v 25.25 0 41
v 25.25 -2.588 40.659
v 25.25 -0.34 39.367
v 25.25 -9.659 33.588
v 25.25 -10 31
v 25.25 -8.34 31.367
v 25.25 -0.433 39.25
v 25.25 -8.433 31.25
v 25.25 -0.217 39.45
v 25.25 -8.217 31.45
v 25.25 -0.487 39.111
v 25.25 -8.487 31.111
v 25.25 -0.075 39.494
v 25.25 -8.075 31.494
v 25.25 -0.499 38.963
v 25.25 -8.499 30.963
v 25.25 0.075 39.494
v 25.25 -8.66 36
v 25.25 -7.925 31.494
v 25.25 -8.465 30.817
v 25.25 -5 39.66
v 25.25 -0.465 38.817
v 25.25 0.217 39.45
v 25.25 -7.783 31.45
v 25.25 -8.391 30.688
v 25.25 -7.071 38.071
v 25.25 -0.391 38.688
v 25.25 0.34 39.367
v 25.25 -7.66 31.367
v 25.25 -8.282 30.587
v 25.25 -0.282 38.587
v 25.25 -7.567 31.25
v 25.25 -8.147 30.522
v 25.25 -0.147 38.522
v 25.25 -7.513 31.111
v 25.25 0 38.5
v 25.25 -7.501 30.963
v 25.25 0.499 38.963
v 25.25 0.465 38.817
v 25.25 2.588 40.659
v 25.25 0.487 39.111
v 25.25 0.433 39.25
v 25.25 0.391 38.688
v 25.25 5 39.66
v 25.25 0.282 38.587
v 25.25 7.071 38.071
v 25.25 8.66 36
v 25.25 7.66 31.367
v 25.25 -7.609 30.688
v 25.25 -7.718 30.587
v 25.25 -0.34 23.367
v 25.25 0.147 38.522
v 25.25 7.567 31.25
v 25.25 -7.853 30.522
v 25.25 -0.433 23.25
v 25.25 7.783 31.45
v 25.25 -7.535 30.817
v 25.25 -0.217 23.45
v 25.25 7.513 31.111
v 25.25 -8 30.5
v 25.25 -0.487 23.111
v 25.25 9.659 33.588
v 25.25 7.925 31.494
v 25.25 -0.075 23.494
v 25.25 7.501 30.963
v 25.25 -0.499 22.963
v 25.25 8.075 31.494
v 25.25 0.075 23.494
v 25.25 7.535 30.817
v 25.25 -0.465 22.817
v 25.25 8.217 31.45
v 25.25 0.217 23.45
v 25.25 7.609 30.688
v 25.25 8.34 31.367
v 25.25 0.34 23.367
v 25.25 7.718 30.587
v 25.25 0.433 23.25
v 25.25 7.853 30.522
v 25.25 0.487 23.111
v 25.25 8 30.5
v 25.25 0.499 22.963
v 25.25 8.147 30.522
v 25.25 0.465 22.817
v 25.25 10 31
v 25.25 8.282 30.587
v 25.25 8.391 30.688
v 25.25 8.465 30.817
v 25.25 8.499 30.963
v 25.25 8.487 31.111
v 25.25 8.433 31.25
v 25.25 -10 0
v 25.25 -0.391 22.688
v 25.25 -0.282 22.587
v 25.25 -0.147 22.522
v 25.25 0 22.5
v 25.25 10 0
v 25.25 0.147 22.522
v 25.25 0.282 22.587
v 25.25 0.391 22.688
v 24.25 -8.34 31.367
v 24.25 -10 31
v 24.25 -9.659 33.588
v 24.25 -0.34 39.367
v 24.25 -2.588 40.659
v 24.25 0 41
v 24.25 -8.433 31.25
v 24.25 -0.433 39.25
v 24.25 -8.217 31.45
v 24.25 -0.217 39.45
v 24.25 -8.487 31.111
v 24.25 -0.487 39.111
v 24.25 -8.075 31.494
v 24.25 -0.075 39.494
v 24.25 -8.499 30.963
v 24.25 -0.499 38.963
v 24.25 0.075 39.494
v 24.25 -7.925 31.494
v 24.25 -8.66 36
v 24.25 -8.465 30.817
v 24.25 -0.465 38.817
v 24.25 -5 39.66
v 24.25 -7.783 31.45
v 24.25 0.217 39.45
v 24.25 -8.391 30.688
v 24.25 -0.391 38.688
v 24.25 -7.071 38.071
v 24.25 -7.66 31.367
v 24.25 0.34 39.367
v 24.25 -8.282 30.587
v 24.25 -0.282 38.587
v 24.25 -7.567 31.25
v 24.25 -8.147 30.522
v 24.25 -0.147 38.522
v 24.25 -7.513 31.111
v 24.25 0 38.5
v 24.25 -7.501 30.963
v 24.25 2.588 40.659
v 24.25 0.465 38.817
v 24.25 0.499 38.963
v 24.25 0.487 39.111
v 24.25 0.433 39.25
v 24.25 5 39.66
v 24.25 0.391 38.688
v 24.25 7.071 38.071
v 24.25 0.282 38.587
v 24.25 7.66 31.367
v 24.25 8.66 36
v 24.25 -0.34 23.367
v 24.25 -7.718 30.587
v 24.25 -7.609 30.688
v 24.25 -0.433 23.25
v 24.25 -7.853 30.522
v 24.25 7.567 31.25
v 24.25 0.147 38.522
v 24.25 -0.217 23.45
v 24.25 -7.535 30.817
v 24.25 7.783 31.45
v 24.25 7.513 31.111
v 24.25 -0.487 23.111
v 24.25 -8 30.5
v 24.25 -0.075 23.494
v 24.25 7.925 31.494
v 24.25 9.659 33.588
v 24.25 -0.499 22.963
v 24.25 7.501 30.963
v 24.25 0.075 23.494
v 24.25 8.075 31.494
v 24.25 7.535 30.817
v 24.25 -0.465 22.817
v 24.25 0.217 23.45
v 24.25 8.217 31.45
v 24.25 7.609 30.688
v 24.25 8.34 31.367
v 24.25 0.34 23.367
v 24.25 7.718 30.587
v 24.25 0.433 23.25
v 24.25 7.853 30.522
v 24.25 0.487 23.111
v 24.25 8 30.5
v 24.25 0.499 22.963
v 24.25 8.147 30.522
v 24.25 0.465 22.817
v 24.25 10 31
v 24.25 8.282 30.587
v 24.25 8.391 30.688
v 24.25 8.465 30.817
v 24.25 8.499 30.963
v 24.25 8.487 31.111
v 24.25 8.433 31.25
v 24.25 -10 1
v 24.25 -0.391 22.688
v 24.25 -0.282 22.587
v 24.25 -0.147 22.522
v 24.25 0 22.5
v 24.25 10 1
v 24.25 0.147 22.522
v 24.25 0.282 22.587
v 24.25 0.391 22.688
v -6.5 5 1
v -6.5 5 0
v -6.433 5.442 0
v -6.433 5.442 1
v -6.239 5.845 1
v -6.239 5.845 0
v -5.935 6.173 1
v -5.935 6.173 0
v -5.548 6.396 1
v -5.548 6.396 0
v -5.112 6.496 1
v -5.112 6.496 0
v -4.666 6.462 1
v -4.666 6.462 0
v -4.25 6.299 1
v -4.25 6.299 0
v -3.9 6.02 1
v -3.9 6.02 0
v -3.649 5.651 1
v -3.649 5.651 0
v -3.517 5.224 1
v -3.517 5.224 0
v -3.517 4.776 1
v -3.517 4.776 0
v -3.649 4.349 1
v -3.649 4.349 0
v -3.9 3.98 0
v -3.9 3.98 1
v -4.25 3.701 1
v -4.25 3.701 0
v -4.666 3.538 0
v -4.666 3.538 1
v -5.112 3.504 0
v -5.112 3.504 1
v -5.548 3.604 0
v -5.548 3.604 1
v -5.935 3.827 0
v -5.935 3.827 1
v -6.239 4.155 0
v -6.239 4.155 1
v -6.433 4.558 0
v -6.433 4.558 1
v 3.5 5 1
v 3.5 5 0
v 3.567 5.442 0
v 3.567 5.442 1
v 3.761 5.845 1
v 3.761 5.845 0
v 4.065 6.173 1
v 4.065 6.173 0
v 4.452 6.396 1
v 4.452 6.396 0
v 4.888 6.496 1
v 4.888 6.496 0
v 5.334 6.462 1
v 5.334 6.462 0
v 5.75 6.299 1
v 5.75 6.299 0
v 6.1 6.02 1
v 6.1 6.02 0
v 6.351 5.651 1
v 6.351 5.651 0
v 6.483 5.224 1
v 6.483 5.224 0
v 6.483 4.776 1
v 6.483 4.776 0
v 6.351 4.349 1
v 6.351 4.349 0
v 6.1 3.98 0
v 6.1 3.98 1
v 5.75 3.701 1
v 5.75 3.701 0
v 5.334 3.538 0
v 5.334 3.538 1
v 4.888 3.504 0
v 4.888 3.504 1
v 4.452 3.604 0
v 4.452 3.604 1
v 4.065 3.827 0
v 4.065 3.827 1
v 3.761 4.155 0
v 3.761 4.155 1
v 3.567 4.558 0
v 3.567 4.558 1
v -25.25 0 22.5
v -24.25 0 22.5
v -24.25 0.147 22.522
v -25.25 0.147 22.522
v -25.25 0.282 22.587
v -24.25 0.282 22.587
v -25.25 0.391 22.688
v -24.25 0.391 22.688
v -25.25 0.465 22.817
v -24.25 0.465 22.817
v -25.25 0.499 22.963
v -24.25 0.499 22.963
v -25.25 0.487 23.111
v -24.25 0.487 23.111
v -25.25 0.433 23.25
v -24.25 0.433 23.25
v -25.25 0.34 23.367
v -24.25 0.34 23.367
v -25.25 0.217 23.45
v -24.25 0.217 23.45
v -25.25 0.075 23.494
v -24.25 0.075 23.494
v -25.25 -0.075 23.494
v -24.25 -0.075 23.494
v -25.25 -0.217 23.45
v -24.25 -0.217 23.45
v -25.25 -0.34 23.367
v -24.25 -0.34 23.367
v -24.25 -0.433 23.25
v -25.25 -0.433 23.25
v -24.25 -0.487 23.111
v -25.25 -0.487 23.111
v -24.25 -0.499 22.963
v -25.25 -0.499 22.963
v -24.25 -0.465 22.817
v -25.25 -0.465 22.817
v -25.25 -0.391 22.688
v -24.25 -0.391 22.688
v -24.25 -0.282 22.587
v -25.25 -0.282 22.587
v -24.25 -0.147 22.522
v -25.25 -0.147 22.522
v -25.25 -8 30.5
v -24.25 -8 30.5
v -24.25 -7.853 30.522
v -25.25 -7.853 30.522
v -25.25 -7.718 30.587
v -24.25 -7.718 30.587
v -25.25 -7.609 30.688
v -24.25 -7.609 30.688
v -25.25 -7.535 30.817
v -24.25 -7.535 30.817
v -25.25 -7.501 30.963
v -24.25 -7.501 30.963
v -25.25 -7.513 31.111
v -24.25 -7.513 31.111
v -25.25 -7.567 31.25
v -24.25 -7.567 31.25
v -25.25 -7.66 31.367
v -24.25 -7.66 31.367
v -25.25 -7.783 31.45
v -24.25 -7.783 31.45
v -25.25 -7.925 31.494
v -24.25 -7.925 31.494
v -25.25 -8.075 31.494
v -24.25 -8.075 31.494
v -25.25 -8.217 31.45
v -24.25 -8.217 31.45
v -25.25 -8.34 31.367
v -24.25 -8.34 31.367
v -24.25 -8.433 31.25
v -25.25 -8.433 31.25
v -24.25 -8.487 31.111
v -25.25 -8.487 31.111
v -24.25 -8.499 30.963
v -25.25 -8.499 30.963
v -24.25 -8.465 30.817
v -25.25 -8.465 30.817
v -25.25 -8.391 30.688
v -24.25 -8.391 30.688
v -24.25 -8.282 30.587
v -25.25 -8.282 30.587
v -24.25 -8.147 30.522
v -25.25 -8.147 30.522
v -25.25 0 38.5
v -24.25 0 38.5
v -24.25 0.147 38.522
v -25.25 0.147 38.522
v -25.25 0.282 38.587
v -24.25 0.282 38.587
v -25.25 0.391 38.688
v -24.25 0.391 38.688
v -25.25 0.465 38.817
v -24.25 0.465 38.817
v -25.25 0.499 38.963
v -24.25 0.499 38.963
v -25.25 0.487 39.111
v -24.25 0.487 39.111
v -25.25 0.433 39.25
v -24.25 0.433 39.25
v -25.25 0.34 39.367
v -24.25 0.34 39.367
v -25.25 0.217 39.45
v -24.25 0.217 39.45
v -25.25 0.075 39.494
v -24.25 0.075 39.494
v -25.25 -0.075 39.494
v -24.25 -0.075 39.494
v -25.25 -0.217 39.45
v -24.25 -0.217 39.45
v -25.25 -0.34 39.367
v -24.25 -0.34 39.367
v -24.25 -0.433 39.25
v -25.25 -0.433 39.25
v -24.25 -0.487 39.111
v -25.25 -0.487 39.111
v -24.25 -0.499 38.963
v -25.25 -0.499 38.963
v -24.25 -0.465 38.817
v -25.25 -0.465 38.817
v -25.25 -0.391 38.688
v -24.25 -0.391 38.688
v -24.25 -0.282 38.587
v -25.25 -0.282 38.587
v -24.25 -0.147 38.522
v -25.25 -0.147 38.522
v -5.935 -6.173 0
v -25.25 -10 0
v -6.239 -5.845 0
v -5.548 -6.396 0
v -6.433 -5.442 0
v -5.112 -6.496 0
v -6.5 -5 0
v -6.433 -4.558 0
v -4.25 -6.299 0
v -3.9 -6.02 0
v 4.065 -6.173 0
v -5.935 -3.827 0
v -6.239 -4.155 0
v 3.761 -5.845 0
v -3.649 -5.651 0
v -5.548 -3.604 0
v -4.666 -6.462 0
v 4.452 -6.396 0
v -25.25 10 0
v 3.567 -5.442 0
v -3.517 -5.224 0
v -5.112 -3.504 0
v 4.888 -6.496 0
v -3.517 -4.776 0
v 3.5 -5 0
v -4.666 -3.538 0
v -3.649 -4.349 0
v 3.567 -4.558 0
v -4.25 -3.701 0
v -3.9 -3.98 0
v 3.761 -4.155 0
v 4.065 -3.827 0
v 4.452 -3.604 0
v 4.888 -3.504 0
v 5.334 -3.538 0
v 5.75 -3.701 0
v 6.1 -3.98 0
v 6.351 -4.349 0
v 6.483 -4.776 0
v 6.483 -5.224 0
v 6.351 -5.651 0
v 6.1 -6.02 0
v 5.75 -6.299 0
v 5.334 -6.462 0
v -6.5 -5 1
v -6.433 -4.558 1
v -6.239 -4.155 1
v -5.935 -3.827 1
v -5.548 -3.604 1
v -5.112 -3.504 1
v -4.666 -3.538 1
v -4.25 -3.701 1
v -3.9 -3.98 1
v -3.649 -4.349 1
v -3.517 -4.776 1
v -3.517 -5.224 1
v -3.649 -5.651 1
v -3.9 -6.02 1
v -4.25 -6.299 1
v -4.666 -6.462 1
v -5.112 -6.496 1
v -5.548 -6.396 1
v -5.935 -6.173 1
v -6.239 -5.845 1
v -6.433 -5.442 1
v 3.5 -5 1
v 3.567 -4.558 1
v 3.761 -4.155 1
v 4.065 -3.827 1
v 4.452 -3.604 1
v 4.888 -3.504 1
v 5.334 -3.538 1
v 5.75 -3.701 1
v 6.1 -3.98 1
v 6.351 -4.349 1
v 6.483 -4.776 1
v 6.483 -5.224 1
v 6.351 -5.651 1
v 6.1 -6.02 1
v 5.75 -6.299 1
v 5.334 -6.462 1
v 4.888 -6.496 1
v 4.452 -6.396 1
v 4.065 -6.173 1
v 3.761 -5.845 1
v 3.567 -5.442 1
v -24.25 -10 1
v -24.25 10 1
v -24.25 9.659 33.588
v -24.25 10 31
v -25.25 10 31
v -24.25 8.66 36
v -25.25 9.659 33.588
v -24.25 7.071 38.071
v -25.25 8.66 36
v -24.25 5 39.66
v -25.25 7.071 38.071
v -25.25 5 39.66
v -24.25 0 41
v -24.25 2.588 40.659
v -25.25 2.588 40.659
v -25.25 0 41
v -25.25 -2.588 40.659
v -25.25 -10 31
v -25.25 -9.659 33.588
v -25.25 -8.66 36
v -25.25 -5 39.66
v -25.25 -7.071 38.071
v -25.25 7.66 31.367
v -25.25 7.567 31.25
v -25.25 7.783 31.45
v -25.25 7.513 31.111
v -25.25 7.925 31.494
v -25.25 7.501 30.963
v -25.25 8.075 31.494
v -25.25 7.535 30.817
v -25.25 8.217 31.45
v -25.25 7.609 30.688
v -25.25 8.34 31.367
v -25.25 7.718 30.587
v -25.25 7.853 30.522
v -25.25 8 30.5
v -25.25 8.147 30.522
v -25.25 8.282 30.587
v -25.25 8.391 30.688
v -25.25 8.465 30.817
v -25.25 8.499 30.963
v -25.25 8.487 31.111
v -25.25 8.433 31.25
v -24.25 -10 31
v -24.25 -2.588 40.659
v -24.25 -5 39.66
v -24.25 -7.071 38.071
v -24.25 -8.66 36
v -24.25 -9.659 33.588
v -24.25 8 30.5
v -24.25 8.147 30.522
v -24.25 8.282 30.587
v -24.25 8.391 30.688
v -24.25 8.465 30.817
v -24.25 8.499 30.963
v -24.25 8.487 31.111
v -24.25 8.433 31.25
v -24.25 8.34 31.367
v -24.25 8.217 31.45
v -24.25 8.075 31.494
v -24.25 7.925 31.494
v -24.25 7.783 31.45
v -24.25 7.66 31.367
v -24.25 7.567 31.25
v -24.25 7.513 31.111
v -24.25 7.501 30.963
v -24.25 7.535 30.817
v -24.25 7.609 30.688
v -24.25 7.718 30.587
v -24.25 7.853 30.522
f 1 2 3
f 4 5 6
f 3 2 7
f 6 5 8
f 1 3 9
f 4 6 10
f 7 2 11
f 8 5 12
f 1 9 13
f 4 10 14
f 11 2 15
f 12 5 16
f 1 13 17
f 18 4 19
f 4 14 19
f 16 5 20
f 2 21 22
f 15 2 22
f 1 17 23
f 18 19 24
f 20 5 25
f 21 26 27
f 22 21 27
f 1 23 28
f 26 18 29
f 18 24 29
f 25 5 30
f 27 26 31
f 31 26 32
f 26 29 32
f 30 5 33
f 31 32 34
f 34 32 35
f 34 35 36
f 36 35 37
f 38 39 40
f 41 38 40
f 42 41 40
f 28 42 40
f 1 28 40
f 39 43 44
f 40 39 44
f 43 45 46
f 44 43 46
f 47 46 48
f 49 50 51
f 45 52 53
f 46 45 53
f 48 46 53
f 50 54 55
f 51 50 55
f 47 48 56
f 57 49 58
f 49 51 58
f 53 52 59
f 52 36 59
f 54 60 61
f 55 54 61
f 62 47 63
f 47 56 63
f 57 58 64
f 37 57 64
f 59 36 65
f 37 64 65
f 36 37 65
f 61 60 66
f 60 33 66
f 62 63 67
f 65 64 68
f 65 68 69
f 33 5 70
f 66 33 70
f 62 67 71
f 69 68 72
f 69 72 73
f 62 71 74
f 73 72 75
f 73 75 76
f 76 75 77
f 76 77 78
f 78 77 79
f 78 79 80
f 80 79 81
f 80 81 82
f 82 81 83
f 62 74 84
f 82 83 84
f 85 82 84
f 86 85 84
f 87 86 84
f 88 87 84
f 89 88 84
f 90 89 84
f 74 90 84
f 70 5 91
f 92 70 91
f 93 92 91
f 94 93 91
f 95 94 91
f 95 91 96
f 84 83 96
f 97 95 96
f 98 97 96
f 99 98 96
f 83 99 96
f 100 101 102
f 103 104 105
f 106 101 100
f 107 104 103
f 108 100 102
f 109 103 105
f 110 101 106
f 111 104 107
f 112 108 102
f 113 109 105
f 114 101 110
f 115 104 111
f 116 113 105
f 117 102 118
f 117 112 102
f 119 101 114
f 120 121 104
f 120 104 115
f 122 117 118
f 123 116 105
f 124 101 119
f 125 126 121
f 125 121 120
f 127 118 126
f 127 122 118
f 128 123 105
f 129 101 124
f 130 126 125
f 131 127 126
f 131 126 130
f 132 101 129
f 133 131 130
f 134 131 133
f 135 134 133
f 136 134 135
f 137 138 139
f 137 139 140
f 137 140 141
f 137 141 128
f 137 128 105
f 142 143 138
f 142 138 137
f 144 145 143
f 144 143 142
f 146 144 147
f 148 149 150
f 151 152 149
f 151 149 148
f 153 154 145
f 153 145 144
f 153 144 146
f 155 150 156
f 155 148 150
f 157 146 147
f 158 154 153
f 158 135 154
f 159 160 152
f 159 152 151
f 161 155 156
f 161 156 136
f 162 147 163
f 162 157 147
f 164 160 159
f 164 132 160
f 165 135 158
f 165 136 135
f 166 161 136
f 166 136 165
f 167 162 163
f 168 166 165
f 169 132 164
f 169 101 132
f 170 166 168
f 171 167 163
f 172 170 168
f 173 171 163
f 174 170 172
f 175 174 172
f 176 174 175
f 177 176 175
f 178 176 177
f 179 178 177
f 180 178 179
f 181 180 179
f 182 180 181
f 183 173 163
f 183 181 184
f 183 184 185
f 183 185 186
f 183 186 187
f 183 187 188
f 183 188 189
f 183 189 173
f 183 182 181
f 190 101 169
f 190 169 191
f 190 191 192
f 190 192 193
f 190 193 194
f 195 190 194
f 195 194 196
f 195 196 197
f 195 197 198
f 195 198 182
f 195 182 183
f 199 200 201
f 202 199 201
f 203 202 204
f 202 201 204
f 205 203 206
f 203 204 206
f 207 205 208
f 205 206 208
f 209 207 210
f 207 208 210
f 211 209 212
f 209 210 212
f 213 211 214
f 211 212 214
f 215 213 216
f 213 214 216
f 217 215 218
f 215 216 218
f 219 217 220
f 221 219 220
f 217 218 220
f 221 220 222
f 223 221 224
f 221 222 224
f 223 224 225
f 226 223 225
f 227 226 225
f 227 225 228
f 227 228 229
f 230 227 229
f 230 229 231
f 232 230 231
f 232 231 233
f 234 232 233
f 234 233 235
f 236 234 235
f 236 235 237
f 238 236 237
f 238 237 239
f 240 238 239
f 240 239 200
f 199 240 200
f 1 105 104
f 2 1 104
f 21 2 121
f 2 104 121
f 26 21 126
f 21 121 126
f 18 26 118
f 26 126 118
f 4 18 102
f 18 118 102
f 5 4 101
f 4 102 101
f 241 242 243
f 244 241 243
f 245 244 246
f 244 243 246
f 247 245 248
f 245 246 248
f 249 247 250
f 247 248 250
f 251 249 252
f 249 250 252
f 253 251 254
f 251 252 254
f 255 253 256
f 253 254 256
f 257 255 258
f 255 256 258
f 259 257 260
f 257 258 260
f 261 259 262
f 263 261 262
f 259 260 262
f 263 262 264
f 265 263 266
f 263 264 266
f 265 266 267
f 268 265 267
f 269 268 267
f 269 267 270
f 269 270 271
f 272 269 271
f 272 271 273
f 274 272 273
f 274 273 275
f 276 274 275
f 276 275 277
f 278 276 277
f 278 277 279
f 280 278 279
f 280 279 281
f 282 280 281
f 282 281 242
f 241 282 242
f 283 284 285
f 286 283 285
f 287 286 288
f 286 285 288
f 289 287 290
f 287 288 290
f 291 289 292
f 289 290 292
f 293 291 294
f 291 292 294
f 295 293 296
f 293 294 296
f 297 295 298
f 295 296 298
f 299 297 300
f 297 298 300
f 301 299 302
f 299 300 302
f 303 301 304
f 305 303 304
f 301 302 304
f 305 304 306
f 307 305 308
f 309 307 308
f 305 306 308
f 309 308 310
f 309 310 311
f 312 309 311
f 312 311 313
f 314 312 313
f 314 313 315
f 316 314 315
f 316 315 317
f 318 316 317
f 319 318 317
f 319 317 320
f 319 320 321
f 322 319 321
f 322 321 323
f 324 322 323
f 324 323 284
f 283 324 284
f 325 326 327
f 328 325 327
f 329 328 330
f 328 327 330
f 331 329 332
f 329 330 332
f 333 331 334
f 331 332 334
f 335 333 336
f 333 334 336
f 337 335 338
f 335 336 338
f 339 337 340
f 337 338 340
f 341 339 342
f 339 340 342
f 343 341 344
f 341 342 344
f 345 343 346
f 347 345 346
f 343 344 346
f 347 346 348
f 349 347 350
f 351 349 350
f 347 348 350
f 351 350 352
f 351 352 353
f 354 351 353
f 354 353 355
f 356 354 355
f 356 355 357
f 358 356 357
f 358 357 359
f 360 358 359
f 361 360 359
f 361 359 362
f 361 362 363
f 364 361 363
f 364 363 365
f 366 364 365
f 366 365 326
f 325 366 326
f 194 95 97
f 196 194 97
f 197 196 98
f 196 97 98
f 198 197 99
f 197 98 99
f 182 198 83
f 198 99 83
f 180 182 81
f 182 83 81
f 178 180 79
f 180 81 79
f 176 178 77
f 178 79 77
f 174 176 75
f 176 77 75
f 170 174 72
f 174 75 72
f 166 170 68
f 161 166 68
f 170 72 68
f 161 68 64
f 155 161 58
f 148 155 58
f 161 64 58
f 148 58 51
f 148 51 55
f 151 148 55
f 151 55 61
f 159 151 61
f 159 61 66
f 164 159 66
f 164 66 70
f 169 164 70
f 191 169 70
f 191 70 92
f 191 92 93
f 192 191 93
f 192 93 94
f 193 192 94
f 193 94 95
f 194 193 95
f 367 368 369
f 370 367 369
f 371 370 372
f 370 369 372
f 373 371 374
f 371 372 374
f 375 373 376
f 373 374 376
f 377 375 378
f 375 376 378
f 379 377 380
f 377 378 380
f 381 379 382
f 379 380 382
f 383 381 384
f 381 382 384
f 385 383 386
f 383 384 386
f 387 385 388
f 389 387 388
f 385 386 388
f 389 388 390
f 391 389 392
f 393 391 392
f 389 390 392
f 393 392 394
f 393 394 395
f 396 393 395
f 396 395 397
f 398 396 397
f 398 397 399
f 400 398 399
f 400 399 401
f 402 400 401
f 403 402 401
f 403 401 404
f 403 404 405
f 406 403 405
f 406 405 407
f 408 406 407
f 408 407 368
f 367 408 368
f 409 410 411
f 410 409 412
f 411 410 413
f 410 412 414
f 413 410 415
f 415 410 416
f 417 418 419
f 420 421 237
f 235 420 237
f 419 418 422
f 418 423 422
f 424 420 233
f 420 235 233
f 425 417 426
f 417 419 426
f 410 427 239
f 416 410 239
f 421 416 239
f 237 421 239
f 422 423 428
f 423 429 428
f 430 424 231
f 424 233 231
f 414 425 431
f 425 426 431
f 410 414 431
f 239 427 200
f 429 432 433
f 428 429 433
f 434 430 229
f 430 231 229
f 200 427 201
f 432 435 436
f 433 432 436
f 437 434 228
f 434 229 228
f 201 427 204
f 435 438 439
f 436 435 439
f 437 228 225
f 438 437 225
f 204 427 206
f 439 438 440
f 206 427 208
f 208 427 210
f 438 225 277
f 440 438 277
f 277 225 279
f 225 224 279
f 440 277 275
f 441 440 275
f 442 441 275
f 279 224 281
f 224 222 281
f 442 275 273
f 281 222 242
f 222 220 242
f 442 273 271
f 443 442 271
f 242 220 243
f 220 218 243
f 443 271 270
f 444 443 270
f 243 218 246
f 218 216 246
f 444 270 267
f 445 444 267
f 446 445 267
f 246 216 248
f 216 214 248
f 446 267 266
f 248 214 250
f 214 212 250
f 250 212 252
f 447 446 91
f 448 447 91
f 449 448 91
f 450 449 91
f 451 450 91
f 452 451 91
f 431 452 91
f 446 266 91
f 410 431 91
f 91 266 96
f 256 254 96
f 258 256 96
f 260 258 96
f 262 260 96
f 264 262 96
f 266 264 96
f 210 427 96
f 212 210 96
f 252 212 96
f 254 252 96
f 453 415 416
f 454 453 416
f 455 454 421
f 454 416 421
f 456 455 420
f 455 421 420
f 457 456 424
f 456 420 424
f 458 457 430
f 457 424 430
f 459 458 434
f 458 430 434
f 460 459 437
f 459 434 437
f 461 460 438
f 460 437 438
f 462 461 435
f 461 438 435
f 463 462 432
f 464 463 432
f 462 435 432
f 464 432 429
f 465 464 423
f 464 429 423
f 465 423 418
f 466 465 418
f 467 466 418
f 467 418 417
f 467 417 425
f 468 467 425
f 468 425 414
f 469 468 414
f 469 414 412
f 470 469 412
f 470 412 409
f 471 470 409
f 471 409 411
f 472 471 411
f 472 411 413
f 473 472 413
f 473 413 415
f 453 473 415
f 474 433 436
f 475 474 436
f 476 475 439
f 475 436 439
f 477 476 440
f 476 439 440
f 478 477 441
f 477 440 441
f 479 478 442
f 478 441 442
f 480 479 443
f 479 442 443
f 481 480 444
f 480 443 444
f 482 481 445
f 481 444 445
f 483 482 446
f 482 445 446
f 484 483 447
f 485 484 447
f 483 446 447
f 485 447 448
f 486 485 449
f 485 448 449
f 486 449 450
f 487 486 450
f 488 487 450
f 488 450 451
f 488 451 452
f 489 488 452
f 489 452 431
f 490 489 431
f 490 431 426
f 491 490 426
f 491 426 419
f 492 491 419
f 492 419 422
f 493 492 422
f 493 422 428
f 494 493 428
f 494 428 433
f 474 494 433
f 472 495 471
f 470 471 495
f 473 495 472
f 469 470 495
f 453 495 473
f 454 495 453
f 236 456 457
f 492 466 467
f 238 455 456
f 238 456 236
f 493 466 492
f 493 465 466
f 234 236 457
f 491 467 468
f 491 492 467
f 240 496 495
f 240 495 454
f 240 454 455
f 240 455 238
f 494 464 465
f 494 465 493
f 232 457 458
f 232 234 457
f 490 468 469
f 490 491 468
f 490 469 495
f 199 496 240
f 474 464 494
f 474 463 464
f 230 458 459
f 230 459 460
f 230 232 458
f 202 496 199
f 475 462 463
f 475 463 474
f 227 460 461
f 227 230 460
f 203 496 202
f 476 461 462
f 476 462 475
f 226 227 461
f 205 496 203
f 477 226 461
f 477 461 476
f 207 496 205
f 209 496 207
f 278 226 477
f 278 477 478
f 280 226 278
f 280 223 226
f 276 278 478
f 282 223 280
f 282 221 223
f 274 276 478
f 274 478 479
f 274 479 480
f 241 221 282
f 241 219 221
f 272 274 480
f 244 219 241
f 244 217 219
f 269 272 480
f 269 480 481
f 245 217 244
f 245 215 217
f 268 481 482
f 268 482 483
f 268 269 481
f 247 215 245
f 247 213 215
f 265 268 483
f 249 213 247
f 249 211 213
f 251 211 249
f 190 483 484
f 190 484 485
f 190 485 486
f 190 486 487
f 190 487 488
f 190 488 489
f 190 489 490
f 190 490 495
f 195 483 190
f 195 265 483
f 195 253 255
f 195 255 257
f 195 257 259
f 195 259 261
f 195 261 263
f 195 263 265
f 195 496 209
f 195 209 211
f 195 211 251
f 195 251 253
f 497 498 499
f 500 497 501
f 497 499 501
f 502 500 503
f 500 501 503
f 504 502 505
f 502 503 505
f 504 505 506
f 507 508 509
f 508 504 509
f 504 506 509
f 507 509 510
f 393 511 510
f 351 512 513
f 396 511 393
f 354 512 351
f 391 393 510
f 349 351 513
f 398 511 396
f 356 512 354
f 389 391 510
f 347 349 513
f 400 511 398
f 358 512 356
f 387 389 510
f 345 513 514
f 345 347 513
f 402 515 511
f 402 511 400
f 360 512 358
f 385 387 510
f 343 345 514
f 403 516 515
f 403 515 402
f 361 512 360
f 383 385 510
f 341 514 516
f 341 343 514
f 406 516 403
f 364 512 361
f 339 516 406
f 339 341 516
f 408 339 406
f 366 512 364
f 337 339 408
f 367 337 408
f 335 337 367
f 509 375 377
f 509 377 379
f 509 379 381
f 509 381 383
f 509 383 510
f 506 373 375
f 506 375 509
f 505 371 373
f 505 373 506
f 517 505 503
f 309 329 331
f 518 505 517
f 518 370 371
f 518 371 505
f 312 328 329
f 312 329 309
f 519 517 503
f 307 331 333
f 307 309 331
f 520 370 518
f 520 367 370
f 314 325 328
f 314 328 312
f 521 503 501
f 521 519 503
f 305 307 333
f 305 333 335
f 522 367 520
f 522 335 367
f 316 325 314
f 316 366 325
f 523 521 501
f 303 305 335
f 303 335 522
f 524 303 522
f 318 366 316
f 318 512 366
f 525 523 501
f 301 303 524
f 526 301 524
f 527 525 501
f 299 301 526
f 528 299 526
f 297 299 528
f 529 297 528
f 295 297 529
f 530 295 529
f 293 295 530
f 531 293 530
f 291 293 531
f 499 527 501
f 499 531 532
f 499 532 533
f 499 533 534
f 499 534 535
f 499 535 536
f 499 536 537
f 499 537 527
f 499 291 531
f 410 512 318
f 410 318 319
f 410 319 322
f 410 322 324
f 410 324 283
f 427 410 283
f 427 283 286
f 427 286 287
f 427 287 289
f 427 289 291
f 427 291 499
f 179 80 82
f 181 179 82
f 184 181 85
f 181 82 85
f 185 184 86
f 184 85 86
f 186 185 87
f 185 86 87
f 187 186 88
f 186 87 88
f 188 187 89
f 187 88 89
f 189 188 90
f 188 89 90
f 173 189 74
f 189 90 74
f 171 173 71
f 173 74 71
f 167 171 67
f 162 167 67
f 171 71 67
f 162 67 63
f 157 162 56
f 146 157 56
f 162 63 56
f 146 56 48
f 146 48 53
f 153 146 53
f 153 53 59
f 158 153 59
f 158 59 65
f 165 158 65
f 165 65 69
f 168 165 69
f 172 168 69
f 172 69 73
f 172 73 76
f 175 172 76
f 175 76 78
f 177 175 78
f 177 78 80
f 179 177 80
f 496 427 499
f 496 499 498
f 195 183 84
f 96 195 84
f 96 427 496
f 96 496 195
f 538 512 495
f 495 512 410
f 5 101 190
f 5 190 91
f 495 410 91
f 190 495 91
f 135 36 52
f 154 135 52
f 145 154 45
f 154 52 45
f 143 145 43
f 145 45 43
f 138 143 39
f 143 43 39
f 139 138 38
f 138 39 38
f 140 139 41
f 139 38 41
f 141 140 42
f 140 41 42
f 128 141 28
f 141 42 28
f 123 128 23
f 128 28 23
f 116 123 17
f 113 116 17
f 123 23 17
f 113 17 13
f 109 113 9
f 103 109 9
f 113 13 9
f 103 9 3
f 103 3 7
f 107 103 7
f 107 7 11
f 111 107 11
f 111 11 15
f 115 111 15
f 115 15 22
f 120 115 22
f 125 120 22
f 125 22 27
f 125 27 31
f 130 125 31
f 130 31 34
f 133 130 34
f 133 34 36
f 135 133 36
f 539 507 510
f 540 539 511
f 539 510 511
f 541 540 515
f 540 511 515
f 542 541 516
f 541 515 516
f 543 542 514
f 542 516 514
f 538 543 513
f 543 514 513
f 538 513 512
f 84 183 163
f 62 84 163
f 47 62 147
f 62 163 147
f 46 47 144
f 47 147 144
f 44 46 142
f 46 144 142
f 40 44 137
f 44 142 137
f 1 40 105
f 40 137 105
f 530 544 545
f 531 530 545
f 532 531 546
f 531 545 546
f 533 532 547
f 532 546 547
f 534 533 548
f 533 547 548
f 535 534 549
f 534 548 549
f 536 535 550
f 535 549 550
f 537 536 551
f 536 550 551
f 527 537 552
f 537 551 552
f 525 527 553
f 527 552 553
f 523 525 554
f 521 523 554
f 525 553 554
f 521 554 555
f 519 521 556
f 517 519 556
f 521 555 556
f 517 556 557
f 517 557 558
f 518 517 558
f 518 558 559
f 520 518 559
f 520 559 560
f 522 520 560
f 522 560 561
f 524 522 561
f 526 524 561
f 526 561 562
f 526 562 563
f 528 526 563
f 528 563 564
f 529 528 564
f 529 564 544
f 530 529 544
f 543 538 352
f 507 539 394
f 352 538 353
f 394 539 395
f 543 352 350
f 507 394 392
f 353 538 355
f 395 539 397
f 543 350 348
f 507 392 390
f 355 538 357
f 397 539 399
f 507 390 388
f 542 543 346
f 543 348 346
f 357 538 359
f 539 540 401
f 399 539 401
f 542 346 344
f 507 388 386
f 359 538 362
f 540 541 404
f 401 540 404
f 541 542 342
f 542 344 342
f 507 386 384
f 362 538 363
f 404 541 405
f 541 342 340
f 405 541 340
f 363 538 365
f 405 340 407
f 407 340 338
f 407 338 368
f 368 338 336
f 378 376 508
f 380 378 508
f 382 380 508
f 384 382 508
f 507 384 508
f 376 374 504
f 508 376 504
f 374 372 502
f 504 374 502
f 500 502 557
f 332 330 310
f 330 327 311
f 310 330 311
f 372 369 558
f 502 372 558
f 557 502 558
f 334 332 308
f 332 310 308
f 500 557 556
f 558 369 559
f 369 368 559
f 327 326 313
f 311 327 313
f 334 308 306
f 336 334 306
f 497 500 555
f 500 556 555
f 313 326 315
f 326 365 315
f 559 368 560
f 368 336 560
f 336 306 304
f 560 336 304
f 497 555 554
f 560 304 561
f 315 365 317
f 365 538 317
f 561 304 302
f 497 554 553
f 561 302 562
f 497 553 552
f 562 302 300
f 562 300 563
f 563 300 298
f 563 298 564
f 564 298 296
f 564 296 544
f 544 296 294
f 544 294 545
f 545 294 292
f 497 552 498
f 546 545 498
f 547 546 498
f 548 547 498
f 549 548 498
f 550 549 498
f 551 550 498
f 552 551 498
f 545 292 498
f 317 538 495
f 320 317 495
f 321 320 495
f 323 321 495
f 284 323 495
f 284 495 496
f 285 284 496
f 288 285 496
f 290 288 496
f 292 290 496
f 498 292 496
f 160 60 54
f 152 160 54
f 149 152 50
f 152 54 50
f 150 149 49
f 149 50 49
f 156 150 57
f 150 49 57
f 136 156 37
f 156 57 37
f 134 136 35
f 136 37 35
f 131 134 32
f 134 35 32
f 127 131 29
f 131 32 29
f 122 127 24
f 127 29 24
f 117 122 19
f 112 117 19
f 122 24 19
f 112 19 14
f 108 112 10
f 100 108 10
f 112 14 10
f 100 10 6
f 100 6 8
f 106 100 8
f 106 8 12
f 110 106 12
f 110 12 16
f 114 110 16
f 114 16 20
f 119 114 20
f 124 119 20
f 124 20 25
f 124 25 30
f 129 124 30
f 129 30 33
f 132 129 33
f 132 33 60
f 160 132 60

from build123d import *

# Parameters (mm, degrees)
SKETCH_1_W          = 50.5
SKETCH_1_H          = 20
EXTRUDE_1_DEPTH     = 1
SKETCH_2_W          = 1
SKETCH_2_H          = 20
EXTRUDE_2_DEPTH     = 40
CUT_EXTRUDE_2_DEPTH = 100
SKETCH_4_R          = 0.5
CUT_EXTRUDE_3_DEPTH = 66.812232905
CUT_EXTRUDE_4_REACH = 51.179
SKETCH_5_R          = 1.5


with BuildPart() as part:
    # 草图1 → 凸台-拉伸1 (new body)
    with BuildSketch(Plane.XY):
        Rectangle(SKETCH_1_W, SKETCH_1_H)
    extrude(amount=EXTRUDE_1_DEPTH)

    # 草图2 → 凸台-拉伸2 (add)
    with BuildSketch(Plane.XY.offset(1)):
        with Locations((-24.75, 0)):
            Rectangle(SKETCH_2_W, SKETCH_2_H)
        with Locations((24.75, 0)):
            Rectangle(SKETCH_2_W, SKETCH_2_H)
    extrude(amount=EXTRUDE_2_DEPTH)

    # 草图3 → 切除-拉伸2 (cut)
    with BuildSketch(Plane.ZY.offset(25.25)):
        with BuildLine():
            Line((31, -10), (41, -10))
            Line((41, -10), (41, 0))
            ThreePointArc((41, 0), (38.071067812, -7.071067812), (31, -10))
        make_face()
        with BuildLine():
            ThreePointArc((31, 10), (38.071067812, 7.071067812), (41, 0))
            Line((41, 0), (41, 10))
            Line((41, 10), (31, 10))
        make_face()
    extrude(amount=-CUT_EXTRUDE_2_DEPTH, mode=Mode.SUBTRACT)

    # 草图4 → 切除-拉伸3 (cut, through all)
    with BuildSketch(Plane(origin=(25.25, 0, 0), x_dir=(0, 0, -1), z_dir=(1, 0, 0))):
        with Locations((-39, 0)):
            Circle(SKETCH_4_R)
        with Locations((-31, 8)):
            Circle(SKETCH_4_R)
        with Locations((-23, 0)):
            Circle(SKETCH_4_R)
        with Locations((-31, -8)):
            Circle(SKETCH_4_R)
    extrude(amount=-CUT_EXTRUDE_3_DEPTH, mode=Mode.SUBTRACT)

    # 草图5 → 切除-拉伸4 (cut, up to next)
    with BuildSketch(Plane(origin=(0, 0, 0), x_dir=(-1, 0, 0), z_dir=(0, 0, -1)), mode=Mode.PRIVATE) as cut_extrude_4_sk1:
        with Locations((-5, 5)):
            Circle(SKETCH_5_R)
    cut_extrude_4_tool1 = extrude(cut_extrude_4_sk1.sketch, amount=-CUT_EXTRUDE_4_REACH, mode=Mode.PRIVATE) & part.part
    # 草图5 → 切除-拉伸4 (cut, up to next)
    with BuildSketch(Plane(origin=(0, 0, 0), x_dir=(-1, 0, 0), z_dir=(0, 0, -1)), mode=Mode.PRIVATE) as cut_extrude_4_sk2:
        with Locations((-5, -5)):
            Circle(SKETCH_5_R)
    cut_extrude_4_tool2 = extrude(cut_extrude_4_sk2.sketch, amount=-CUT_EXTRUDE_4_REACH, mode=Mode.PRIVATE) & part.part
    # 草图5 → 切除-拉伸4 (cut, up to next)
    with BuildSketch(Plane(origin=(0, 0, 0), x_dir=(-1, 0, 0), z_dir=(0, 0, -1)), mode=Mode.PRIVATE) as cut_extrude_4_sk3:
        with Locations((5, 5)):
            Circle(SKETCH_5_R)
    cut_extrude_4_tool3 = extrude(cut_extrude_4_sk3.sketch, amount=-CUT_EXTRUDE_4_REACH, mode=Mode.PRIVATE) & part.part
    # 草图5 → 切除-拉伸4 (cut, up to next)
    with BuildSketch(Plane(origin=(0, 0, 0), x_dir=(-1, 0, 0), z_dir=(0, 0, -1)), mode=Mode.PRIVATE) as cut_extrude_4_sk4:
        with Locations((5, -5)):
            Circle(SKETCH_5_R)
    cut_extrude_4_tool4 = extrude(cut_extrude_4_sk4.sketch, amount=-CUT_EXTRUDE_4_REACH, mode=Mode.PRIVATE) & part.part
    add(cut_extrude_4_tool1.solids().sort_by_distance((5, 5, 0))[0], mode=Mode.SUBTRACT)
    add(cut_extrude_4_tool2.solids().sort_by_distance((5, -5, 0))[0], mode=Mode.SUBTRACT)
    add(cut_extrude_4_tool3.solids().sort_by_distance((-5, 5, 0))[0], mode=Mode.SUBTRACT)
    add(cut_extrude_4_tool4.solids().sort_by_distance((-5, -5, 0))[0], mode=Mode.SUBTRACT)


solid = part.part
